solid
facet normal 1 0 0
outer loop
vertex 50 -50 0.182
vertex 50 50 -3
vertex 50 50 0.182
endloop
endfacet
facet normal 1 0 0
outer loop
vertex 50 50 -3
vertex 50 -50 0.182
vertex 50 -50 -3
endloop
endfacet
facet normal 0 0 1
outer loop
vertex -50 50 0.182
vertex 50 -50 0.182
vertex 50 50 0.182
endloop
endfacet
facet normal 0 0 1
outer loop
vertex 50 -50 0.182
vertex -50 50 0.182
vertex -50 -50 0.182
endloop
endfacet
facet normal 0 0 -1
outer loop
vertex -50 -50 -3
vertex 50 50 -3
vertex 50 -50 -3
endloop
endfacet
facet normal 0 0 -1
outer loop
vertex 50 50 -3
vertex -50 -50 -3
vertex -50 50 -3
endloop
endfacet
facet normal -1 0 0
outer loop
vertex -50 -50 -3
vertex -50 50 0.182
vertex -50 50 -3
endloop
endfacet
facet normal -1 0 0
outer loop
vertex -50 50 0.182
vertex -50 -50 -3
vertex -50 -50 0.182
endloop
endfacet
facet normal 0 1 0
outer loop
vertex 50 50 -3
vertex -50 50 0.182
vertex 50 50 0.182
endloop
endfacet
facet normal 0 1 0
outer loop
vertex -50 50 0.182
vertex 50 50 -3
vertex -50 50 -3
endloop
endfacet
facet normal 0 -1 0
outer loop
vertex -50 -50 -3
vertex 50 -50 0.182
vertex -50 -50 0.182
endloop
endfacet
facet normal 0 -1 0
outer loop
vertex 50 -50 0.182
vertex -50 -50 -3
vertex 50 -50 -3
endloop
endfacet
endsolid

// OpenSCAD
// file: _ski_fields.scad
// NZ ski fields — shared parameters and modules. See README.md.
// Heightmap is 8-bit grayscale, 0..255 mapped to elev_min..elev_max metres
// (real values in heightmap.json). Elevation source: AWS Open Data Terrain
// Tiles (Mapzen terrarium).
$fn = 64;

// User-tunable
model_size_mm     = 100;
base_thickness_mm = 3;
z_exaggeration    = 2.00;
lake_level_m      = 310;   // Lake Wakatipu surface elevation (m)

// Global snow line (m): all terrain above this elevation is capped as snow,
// everywhere on the map. The valley floor sits well below this, so it stays
// bare; every alpine massif above the line gets a cap. Raise it to expose more
// rock, lower it for more snow. (~16% of the model is above 1300 m.)
snow_line_m       = 1300;

// Heightmap constants (keep in sync with heightmap.json)
// Renderable files may override heightmap_file and px_count together to trade
// resolution for mesh size — assembly.scad uses the 128 px preview copy so its
// exported STL stays small enough for the in-browser viewer. The two must
// agree: xy_scale is derived from px_count.
heightmap_file = "heightmap.png";
px_count     = 512;
real_area_km = 35;
elev_min_m   = 278.14453125;
elev_range_m = 2028;

// Derived
xy_scale     = model_size_mm / (px_count - 1);
mm_per_metre = model_size_mm / (real_area_km * 1000);
z_mm_total   = elev_range_m * mm_per_metre * z_exaggeration;
// OpenSCAD's surface() maps an 8-bit PNG's 0..255 grey range to height 0..100
// (NOT 0..255). Divide by 100 so a full-white pixel reaches z_mm_total and the
// model achieves the stated z_exaggeration. This also makes elev_to_z() agree
// with the actual surface height, so the snow-line plane lands inside the
// terrain (a /255 divisor put the snow line above the peaks, rendering the
// snow part empty).
z_scale      = z_mm_total / 100;

function elev_to_z(e) = (e - elev_min_m) / elev_range_m * z_mm_total;

// The terrain heightfield surface (no base). Bottom sits at z = 0.
module terrain_surface() {
  scale([xy_scale, xy_scale, z_scale])
    surface(file = heightmap_file, center = true,
            invert = false, convexity = 10);
}

// The flat base slab: from the model bottom up to z = 0, where it meets the
// surface (whose floor also sits at z = 0). Its top stays below the lake water
// line, so no base material is left capping the lake.
module terrain_base() {
  translate([0, 0, -base_thickness_mm / 2])
    cube([model_size_mm, model_size_mm, base_thickness_mm], center = true);
}

module terrain_solid() {
  union() { terrain_surface(); terrain_base(); }
}

// Axis-aligned Z slab spanning the whole XY footprint (+2 mm margin).
module zslab(z_lo, z_hi) {
  translate([0, 0, (z_lo + z_hi) / 2])
    cube([model_size_mm + 2, model_size_mm + 2, z_hi - z_lo], center = true);
}

// Pure geometric mask for everything above the global snow line — no terrain
// dependency. A single Z slab spanning the whole footprint, so every massif
// that pokes above snow_line_m is captured.
module snow_mask() {
  zslab(elev_to_z(snow_line_m), z_mm_total + 2);
}

// ---- Lake (printed as a separate material) ---------------------------------
// The lake is a solid insert filling its footprint up to the water surface. Its
// bed is an estimated sloped basin: flat-deep down the middle, ramping up to the
// shoreline so the banks incline believably instead of dropping straight down.
// The bed shape is baked into lake_bed.png (a bathymetry heightfield) by
// scripts/generate_lake_bed.py — grey 255 = bed at the water surface (no lake),
// grey 0 = bed at the model bottom (full depth).
//
// Because the bed narrows with depth, the deep lake no longer spans the narrow
// neck near the SW corner, so the terrain stays a single connected piece via the
// bank beneath the neck — no separate land bridge is needed.
lake_surface_z = elev_to_z(lake_level_m);

// lake_bed.png is rendered at its own (lower) resolution; surface() lays one
// sample per pixel, so an N-px map spans 0..N-1 units. Must match
// scripts/generate_lake_bed.py --px.
lake_bed_px = 128;
lake_bed_xy_scale = model_size_mm / (lake_bed_px - 1);

// The lakebed as a solid: grey 0..255 maps to bed height over
// [-base_thickness_mm .. lake_surface_z]. Spans from the model bottom up to the
// bed; the water column is whatever lies above it. Outside the lake the bed sits
// at the water surface, so nothing is above it there.
module lakebed_solid() {
  translate([0, 0, -base_thickness_mm])
    scale([lake_bed_xy_scale, lake_bed_xy_scale,
           (lake_surface_z + base_thickness_mm) / 100])
      surface(file = "lake_bed.png", center = true,
              invert = false, convexity = 10);
}

// The lake water column: between the sloped bed and the flat water surface.
// Empty outside the lake (bed == water surface there). The water slab is clipped
// to the lakebed footprint (exactly model_size_mm), NOT the +2 mm-oversized
// zslab: beyond the bed there is nothing to subtract, which would leave a
// full-height water strip wrapping the entire model perimeter. The bed surface
// spans precisely model_size_mm, so the slab must match it.
module lake_region() {
  difference() {
    translate([0, 0, (lake_surface_z - base_thickness_mm) / 2])
      cube([model_size_mm, model_size_mm, lake_surface_z + base_thickness_mm],
           center = true);
    lakebed_solid();
  }
}

module lake_solid() { lake_region(); }

// Snow caps: the surface above the snow line (the base never reaches it).
module snow_solid() {
  intersection() { terrain_surface(); snow_mask(); }
}

// Everything that is neither lake nor snow. The lake water column is carved out
// of the terrain; the terrain keeps the bank wedge below the bed, which slopes
// up to meet the shoreline. The Manifold backend handles this heightfield
// boolean cheaply.
module terrain_part() {
  difference() { terrain_solid(); lake_region(); snow_mask(); }
}
// main file
// Lake Wakatipu band — base up to lake surface. Print in blue.
include <_ski_fields.scad>
lake_solid();
